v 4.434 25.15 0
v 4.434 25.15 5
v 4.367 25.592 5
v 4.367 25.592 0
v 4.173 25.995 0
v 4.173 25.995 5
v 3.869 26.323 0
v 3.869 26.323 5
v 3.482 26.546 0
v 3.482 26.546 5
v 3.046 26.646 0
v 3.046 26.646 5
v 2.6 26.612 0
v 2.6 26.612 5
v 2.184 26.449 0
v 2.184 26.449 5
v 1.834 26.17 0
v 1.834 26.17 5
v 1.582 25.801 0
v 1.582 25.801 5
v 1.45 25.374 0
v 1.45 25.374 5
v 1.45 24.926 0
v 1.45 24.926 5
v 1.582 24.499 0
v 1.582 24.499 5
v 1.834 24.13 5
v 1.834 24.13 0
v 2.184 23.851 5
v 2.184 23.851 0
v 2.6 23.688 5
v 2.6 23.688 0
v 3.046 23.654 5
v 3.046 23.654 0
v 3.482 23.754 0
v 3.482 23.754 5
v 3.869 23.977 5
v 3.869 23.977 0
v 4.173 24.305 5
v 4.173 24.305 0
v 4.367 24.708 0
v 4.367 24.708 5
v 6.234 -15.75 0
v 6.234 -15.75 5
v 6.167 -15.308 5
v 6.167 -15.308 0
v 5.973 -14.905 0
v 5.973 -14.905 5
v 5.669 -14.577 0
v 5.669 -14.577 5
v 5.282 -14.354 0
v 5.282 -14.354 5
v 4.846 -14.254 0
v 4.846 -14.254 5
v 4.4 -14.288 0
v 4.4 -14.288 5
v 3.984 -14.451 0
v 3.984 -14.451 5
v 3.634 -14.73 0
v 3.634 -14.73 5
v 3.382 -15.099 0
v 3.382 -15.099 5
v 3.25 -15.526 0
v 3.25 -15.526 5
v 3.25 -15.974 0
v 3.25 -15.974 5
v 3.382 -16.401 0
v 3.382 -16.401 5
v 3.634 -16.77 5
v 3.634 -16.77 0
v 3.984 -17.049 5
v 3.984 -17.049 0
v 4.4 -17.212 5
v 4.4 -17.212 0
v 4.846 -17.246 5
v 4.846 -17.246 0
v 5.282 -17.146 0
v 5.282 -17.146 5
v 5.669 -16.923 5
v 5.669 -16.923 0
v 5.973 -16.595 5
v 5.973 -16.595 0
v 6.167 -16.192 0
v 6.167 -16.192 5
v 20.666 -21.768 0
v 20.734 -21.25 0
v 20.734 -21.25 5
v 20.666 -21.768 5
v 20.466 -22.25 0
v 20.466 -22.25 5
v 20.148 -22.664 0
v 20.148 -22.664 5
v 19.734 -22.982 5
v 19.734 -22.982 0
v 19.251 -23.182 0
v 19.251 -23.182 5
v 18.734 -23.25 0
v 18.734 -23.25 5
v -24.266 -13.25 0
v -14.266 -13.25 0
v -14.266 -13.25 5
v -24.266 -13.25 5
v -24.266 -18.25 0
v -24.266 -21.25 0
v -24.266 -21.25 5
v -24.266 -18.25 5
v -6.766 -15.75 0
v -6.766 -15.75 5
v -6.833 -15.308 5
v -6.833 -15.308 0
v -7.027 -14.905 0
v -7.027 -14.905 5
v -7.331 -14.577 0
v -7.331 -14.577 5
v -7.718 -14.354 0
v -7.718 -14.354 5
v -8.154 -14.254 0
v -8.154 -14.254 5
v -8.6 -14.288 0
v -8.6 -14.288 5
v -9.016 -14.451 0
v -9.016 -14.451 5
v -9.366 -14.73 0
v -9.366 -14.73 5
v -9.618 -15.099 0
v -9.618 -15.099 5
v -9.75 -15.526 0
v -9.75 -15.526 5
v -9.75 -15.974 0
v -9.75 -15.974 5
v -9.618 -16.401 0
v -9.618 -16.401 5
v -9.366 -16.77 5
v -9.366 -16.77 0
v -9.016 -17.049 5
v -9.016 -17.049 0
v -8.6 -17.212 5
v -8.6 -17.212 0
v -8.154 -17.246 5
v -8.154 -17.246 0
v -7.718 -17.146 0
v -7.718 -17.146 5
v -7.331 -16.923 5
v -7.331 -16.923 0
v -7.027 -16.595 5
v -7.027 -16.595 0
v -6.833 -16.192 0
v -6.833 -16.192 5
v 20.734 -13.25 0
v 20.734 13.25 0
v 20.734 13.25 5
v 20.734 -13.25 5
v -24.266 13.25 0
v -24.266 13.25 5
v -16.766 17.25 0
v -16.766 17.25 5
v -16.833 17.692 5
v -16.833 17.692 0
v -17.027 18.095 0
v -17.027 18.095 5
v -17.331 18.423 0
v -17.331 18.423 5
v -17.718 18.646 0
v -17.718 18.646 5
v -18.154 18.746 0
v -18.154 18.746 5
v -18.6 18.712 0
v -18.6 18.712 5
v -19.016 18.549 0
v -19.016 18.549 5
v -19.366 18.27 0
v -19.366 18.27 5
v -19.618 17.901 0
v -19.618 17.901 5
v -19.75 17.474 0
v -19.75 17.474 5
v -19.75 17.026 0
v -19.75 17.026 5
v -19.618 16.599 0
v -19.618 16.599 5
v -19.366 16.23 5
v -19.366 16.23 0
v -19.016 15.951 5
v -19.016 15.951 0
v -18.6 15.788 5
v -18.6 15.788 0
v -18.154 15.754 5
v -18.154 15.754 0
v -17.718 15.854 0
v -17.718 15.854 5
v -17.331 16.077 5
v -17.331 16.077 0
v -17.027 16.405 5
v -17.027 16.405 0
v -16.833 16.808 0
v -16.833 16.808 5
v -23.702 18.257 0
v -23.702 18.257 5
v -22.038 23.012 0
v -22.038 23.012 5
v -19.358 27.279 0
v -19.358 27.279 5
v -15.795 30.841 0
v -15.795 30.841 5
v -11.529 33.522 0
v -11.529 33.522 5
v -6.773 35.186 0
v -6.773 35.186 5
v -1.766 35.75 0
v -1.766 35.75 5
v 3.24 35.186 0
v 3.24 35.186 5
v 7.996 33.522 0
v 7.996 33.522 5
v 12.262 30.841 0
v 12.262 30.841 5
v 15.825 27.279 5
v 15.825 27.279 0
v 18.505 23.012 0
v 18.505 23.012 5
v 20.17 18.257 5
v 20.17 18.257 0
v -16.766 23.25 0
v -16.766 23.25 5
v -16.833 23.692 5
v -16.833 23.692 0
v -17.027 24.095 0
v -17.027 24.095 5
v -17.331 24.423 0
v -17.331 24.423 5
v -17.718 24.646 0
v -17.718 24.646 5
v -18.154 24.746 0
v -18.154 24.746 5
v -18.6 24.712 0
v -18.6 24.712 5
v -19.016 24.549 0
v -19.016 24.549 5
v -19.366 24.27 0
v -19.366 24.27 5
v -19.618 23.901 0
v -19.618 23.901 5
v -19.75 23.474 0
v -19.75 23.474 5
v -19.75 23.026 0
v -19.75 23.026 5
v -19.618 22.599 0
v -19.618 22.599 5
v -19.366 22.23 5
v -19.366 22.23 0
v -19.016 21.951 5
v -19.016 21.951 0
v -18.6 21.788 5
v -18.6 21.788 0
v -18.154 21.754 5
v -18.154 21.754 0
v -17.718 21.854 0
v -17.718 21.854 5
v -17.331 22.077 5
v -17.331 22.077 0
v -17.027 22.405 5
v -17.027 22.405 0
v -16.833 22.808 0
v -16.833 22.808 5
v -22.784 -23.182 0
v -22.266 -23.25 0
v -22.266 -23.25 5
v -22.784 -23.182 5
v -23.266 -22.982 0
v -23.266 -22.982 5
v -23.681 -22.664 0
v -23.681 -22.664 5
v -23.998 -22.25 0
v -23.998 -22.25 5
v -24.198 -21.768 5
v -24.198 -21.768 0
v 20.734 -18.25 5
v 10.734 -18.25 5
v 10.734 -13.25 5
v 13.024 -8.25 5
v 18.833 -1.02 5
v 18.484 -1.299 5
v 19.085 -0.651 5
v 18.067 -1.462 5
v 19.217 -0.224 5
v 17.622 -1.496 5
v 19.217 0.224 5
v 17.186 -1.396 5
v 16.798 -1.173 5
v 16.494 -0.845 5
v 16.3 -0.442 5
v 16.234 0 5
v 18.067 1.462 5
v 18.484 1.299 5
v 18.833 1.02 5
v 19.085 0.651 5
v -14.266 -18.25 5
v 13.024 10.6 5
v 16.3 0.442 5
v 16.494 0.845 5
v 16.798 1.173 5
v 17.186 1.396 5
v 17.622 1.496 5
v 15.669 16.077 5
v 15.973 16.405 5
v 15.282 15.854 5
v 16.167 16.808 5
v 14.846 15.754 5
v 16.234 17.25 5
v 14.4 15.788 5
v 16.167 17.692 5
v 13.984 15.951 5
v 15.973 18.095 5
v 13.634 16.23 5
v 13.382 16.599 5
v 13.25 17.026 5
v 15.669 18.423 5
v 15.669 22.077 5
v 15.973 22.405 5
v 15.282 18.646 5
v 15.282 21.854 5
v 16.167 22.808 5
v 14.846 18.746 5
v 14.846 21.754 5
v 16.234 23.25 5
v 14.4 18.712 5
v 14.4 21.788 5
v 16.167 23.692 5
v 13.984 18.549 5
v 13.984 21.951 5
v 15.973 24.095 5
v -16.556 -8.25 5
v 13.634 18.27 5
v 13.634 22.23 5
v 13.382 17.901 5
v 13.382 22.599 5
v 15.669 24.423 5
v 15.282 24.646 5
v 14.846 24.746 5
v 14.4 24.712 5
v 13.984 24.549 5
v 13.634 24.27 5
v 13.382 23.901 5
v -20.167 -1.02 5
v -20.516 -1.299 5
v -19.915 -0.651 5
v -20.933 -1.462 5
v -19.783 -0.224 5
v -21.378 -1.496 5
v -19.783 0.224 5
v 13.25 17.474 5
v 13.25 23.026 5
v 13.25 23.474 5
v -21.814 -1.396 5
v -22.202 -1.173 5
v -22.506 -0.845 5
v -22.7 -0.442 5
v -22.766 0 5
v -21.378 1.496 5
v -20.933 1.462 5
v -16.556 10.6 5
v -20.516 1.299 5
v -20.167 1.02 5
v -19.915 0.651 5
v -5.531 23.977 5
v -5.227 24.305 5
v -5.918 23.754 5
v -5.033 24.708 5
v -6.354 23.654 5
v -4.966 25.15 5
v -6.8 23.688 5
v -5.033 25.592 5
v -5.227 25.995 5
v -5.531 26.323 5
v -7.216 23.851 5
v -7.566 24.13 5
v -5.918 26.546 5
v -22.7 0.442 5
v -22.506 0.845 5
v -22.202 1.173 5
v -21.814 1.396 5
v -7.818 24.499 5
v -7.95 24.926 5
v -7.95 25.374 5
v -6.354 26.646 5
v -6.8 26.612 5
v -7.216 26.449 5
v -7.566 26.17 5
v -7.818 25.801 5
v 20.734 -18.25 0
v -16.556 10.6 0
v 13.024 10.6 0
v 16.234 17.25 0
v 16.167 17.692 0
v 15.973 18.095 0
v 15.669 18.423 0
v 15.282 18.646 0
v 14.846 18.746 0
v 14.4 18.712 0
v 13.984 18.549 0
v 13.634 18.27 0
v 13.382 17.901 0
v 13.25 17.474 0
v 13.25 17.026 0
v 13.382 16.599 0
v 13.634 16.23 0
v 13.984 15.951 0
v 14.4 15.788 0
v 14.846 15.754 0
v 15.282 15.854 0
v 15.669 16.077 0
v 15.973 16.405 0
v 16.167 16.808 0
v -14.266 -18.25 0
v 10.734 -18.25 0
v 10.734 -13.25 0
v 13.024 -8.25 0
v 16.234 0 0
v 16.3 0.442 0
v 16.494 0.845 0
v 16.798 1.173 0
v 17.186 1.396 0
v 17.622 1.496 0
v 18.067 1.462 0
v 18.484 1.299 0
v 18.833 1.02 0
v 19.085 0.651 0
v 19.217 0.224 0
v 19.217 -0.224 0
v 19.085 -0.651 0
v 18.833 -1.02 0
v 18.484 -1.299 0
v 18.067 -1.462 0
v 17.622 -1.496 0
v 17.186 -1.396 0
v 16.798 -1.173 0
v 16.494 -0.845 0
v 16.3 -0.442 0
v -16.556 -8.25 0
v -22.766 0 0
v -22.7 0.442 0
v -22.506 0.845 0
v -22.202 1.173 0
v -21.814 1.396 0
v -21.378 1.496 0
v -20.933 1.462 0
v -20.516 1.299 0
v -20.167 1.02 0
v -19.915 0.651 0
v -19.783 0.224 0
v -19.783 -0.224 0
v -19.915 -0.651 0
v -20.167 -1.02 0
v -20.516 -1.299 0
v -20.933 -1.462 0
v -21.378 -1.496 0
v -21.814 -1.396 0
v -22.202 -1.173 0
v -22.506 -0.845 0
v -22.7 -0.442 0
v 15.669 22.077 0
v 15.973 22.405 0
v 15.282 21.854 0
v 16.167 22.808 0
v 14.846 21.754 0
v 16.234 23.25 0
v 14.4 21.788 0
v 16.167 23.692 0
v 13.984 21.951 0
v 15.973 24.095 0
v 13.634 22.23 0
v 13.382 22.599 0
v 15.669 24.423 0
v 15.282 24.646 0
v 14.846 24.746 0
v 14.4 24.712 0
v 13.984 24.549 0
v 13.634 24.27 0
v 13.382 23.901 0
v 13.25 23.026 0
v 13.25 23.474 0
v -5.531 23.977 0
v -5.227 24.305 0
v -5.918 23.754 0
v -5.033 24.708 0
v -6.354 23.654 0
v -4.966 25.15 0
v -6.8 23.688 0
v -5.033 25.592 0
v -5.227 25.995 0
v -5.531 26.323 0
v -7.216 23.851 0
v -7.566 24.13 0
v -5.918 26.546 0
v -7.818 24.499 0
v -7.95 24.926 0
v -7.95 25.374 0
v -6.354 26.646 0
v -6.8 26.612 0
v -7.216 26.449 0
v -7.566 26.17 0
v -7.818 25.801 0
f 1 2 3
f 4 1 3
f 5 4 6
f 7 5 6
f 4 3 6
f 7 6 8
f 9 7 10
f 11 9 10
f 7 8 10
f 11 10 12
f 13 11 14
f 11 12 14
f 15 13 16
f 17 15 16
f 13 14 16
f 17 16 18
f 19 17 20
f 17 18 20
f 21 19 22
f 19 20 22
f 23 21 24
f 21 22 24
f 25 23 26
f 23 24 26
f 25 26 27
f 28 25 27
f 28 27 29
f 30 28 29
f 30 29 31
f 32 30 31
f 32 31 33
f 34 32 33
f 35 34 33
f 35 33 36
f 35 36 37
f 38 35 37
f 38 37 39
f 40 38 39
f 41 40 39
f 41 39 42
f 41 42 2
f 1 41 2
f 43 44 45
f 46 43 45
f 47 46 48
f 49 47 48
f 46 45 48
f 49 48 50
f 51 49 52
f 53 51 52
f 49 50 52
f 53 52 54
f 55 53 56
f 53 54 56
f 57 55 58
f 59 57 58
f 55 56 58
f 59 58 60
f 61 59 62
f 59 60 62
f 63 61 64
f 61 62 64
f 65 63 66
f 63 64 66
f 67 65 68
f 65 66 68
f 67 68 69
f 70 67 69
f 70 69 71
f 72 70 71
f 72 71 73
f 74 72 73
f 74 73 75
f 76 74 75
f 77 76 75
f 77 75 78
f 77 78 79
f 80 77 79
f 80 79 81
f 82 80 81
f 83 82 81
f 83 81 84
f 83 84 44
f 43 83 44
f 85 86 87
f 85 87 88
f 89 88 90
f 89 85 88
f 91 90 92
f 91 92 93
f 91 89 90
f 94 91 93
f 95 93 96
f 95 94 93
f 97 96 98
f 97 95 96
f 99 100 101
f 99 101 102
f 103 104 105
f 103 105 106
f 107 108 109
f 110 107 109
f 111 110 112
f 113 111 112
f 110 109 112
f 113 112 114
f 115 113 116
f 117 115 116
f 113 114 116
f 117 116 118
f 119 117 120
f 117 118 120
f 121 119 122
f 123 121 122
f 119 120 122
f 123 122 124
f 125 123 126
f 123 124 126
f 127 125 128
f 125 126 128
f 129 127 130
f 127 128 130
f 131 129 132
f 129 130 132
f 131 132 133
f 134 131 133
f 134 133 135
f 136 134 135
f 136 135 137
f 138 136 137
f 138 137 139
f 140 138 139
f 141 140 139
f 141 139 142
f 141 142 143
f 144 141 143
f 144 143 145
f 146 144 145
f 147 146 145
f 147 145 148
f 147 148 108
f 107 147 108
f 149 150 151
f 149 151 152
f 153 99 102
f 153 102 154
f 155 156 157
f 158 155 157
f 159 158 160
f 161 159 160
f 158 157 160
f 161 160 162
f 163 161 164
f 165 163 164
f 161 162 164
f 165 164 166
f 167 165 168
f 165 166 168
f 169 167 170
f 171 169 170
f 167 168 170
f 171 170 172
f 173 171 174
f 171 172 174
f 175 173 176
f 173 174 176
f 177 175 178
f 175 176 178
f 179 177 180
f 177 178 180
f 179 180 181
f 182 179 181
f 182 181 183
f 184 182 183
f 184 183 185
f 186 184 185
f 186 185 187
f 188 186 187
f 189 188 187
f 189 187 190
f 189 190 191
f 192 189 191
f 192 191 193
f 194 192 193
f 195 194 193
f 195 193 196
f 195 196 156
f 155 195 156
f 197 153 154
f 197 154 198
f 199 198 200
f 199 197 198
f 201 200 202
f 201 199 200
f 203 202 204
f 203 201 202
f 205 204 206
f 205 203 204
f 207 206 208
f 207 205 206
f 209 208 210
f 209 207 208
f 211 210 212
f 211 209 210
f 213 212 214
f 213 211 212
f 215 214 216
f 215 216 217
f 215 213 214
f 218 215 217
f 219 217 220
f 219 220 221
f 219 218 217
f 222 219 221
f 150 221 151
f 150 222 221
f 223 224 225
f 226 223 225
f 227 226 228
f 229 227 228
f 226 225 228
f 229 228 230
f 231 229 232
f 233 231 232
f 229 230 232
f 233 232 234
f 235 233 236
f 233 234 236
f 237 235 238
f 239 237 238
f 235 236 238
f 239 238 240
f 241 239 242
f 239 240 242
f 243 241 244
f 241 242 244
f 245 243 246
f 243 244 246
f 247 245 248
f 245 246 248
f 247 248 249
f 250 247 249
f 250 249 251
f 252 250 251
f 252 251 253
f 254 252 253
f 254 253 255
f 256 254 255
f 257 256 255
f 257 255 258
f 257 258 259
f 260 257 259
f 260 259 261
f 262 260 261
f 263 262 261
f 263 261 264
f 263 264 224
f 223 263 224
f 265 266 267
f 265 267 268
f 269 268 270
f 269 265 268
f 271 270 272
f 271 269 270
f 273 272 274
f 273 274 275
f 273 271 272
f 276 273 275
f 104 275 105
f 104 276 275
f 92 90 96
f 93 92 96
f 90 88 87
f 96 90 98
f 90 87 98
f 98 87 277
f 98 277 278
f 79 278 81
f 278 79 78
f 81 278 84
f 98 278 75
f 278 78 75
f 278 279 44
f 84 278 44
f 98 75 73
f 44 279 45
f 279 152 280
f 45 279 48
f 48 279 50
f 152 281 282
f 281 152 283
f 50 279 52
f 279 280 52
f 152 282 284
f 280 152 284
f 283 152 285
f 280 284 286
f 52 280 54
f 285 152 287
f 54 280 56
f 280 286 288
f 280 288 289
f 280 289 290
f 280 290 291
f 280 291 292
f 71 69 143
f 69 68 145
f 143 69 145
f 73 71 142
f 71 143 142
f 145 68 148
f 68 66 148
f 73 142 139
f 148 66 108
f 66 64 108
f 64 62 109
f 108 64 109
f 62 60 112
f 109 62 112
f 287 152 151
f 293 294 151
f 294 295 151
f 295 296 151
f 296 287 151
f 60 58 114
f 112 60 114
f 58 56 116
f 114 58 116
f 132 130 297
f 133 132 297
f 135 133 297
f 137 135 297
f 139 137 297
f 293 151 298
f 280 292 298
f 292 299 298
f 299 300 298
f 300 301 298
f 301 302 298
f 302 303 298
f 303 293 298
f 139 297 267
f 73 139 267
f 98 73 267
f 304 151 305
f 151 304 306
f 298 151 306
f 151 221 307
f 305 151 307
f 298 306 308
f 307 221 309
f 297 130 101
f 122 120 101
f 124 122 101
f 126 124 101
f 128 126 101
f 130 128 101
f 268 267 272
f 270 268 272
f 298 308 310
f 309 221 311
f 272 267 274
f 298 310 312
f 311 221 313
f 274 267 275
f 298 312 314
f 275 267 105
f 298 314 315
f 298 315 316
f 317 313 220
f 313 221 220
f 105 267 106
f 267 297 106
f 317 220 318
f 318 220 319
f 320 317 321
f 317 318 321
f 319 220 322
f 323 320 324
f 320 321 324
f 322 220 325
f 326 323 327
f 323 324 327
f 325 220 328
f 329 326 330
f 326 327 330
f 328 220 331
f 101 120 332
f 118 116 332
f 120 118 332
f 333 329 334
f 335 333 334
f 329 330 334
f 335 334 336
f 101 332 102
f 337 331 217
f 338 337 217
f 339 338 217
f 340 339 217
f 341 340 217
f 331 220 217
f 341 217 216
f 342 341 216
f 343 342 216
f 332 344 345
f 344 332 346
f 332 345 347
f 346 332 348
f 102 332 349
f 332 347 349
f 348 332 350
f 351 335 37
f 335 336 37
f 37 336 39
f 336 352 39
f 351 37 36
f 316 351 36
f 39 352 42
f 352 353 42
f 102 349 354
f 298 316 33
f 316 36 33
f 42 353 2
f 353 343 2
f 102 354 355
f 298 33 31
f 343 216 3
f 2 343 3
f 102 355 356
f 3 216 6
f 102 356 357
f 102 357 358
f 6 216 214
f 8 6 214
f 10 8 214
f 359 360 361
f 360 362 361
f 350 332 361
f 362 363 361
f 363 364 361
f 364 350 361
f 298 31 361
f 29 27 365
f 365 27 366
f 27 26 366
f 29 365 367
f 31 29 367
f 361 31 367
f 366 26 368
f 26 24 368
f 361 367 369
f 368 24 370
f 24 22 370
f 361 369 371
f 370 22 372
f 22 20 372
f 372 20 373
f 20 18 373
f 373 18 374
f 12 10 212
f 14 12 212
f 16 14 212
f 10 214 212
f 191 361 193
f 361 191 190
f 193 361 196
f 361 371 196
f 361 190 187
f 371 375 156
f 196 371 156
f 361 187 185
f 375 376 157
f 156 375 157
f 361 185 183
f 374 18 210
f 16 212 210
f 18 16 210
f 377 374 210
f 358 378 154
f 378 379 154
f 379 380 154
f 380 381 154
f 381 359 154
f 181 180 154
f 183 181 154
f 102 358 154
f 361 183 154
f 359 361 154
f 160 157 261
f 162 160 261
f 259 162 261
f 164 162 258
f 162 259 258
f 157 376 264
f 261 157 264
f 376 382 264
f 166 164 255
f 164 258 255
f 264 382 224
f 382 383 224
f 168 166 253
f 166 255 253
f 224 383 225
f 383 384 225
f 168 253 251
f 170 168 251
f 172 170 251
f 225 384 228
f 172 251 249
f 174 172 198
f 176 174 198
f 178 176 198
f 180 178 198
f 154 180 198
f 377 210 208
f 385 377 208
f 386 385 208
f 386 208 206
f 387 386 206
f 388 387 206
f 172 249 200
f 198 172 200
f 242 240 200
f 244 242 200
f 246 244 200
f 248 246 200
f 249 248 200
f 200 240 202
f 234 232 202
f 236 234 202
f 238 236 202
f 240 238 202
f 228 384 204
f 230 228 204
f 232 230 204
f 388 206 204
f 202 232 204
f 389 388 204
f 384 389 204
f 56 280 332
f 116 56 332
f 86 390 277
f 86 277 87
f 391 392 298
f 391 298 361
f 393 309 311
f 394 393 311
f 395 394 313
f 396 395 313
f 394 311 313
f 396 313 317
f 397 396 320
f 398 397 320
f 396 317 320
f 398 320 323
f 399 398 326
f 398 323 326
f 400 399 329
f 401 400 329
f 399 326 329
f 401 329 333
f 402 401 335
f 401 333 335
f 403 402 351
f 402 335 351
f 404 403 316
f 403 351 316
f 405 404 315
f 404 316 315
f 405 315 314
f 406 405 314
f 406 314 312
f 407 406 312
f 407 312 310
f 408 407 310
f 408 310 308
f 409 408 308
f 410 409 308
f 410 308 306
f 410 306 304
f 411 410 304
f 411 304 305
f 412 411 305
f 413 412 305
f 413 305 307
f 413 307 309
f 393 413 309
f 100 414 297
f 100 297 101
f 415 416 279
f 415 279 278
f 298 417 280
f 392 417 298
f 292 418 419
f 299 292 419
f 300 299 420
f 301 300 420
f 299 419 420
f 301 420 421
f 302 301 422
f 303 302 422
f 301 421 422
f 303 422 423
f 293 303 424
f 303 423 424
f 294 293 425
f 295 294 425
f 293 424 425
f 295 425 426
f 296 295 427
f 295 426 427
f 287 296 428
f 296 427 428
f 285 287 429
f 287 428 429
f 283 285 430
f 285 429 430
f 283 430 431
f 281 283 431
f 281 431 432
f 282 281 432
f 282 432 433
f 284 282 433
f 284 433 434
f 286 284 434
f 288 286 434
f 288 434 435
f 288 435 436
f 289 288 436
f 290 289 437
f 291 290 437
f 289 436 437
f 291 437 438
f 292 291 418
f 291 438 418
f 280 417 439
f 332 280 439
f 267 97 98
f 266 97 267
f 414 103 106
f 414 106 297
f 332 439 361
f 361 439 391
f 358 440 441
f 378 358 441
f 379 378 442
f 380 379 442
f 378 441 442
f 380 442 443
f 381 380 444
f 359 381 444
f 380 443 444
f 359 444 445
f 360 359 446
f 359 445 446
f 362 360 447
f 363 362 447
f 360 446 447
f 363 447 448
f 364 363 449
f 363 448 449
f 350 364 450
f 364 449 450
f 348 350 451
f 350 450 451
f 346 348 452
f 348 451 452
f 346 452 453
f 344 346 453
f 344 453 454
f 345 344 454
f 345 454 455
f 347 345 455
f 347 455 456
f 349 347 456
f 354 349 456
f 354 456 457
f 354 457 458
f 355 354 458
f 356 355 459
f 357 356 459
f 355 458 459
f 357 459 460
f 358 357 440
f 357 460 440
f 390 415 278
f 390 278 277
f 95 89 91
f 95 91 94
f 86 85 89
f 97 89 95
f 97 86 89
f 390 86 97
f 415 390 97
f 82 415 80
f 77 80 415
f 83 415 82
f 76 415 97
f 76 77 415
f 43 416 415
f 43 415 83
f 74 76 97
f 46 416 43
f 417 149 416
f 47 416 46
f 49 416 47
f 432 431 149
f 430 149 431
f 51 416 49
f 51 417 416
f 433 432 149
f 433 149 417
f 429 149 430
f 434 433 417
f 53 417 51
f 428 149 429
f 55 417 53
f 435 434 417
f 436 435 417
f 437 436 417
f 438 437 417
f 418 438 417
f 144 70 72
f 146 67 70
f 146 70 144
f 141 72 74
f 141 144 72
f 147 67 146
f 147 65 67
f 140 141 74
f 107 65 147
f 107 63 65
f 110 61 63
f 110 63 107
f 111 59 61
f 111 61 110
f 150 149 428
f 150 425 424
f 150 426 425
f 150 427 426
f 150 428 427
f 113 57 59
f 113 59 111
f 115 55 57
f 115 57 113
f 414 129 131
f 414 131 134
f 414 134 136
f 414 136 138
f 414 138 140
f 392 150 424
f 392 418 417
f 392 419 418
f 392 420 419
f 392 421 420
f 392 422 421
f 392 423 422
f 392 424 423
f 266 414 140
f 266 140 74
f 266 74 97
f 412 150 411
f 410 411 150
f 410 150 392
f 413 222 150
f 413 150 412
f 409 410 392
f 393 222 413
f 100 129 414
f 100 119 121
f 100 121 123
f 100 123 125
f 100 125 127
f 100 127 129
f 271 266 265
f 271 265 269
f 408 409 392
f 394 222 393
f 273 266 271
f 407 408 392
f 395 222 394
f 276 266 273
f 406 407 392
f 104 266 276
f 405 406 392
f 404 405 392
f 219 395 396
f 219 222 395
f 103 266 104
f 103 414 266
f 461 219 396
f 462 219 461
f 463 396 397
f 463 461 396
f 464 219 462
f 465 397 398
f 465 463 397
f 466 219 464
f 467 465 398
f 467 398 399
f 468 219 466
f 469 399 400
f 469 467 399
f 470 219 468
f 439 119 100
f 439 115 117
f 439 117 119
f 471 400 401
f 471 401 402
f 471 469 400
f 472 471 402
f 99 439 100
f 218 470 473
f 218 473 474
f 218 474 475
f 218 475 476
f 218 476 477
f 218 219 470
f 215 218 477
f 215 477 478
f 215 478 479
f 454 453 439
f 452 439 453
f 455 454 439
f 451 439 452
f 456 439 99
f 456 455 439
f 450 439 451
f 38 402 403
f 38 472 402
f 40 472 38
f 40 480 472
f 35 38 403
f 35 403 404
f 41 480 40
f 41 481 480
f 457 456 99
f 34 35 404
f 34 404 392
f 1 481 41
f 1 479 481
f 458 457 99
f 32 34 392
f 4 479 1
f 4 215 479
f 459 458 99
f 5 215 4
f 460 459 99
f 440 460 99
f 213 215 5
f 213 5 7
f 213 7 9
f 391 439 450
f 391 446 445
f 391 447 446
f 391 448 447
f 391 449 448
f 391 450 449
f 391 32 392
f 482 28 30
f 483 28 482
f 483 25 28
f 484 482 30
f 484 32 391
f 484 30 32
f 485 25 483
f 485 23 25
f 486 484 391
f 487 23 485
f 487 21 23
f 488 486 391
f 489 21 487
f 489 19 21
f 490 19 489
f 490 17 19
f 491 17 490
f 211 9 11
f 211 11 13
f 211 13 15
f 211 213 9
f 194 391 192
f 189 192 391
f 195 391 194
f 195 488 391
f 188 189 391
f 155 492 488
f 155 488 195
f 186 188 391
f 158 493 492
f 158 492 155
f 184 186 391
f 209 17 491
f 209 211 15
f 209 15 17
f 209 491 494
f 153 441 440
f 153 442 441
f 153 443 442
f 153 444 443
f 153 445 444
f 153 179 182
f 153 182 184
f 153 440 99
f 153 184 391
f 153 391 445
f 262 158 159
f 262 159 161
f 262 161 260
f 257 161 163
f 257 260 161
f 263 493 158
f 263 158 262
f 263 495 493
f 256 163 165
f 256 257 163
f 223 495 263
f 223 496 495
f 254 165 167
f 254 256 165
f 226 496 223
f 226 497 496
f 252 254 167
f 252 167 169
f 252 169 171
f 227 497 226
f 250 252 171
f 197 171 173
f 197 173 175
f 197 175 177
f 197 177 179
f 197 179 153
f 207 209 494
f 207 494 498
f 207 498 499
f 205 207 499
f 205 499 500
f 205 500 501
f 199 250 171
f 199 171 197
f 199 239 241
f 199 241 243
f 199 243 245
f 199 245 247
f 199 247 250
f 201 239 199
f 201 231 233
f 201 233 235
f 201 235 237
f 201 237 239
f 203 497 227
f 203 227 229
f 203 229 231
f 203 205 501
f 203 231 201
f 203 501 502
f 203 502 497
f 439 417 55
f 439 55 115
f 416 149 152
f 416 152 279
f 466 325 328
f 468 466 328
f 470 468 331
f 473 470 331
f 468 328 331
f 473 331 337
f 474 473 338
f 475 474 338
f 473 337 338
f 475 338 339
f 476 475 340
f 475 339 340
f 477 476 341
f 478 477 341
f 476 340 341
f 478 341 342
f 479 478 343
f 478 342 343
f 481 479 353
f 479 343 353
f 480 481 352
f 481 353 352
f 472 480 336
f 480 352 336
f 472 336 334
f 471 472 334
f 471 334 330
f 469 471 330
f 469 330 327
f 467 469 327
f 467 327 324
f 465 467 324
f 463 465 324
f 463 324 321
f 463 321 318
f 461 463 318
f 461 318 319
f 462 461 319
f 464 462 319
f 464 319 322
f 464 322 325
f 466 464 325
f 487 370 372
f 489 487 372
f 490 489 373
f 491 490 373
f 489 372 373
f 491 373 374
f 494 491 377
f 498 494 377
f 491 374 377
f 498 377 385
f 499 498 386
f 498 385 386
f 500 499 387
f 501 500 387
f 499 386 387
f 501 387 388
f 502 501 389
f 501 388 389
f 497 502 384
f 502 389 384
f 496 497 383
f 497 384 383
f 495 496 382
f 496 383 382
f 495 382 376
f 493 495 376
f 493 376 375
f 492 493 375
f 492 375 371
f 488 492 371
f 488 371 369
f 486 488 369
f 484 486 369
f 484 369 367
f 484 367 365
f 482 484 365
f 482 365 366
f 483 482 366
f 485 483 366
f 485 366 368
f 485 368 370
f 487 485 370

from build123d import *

# Parameters (mm, degrees)
RESSALTO_EXTRUS_O2_DEPTH = 5
ESBO_O9_W                = 29.58
ESBO_O9_H                = 18.85
CORTE_EXTRUS_O1_DEPTH    = 5
ESBO_O10_R               = 1.5
CORTE_EXTRUS_O2_DEPTH    = 5
ESBO_O12_R               = 1.5
CORTE_EXTRUS_O3_DEPTH    = 10
ESBO_O13_R               = 1.5
CORTE_EXTRUS_O4_DEPTH    = 10
ESBO_O14_R               = 1.5
CORTE_EXTRUS_O5_DEPTH    = 76


with BuildPart() as part:
    # Esboço8 → Ressalto-extrusão2 (new body)
    with BuildSketch(Plane.XY):
        with BuildLine():
            Line((-24.266341706, -3.25), (-24.266341706, 13.25))
            ThreePointArc((-24.266341706, 13.25), (-1.766341706, 35.75), (20.733658294, 13.25))
            Line((20.733658294, 13.25), (20.733658294, -3.222268622))
            Line((20.733658294, -3.222268622), (20.733658294, -3.25))
            Line((20.733658294, -3.25), (20.733658294, -13.25))
            Line((20.733658294, -13.25), (10.733658294, -13.25))
            Line((10.733658294, -13.25), (10.733658294, -18.25))
            Line((10.733658294, -18.25), (20.733658294, -18.25))
            Line((20.733658294, -18.25), (20.733658294, -21.25))
            ThreePointArc((20.733658294, -21.25), (20.147871857, -22.664213562), (18.733658294, -23.25))
            Line((18.733658294, -23.25), (-22.266341706, -23.25))
            ThreePointArc((-22.266341706, -23.25), (-23.680555268, -22.664213562), (-24.266341706, -21.25))
            Line((-24.266341706, -21.25), (-24.266341706, -18.25))
            Line((-24.266341706, -18.25), (-14.266341706, -18.25))
            Line((-14.266341706, -18.25), (-14.266341706, -13.25))
            Line((-14.266341706, -13.25), (-24.266341706, -13.25))
            Line((-24.266341706, -13.25), (-24.266341706, -3.25))
        make_face()
    extrude(amount=RESSALTO_EXTRUS_O2_DEPTH)

    # Esboço9 → Corte-extrusão1 (cut)
    with BuildSketch(Plane(origin=(0, 0, 0), x_dir=(-1, 0, 0), z_dir=(0, 0, -1))):
        with Locations((1.766341706, 1.175)):
            Rectangle(ESBO_O9_W, ESBO_O9_H)
    extrude(amount=-CORTE_EXTRUS_O1_DEPTH, mode=Mode.SUBTRACT)

    # Esboço10 → Corte-extrusão2 (cut)
    with BuildSketch(Plane(origin=(0, 0, 0), x_dir=(-1, 0, 0), z_dir=(0, 0, -1))):
        with Locations((-17.733658294, 0)):
            Circle(ESBO_O10_R)
        with Locations((21.266341706, 0)):
            Circle(ESBO_O10_R)
    extrude(amount=-CORTE_EXTRUS_O2_DEPTH, mode=Mode.SUBTRACT)

    # Esboço12 → Corte-extrusão3 (cut)
    with BuildSketch(Plane.XY.offset(5)):
        with Locations((4.733658294, -15.75)):
            Circle(ESBO_O12_R)
        with Locations((-8.266341706, -15.75)):
            Circle(ESBO_O12_R)
    extrude(amount=-CORTE_EXTRUS_O3_DEPTH, mode=Mode.SUBTRACT)

    # Esboço13 → Corte-extrusão4 (cut)
    with BuildSketch(Plane.XY.offset(5)):
        with Locations((2.933658294, 25.15)):
            Circle(ESBO_O13_R)
        with Locations((-6.466341706, 25.15)):
            Circle(ESBO_O13_R)
    extrude(amount=-CORTE_EXTRUS_O4_DEPTH, mode=Mode.SUBTRACT)

    # Esboço14 → Corte-extrusão5 (cut)
    with BuildSketch(Plane.XY.offset(5)):
        with Locations((14.733658294, 17.25)):
            Circle(ESBO_O14_R)
        with Locations((14.733658294, 23.25)):
            Circle(ESBO_O14_R)
        with Locations((-18.266341706, 23.25)):
            Circle(ESBO_O14_R)
        with Locations((-18.266341706, 17.25)):
            Circle(ESBO_O14_R)
    extrude(amount=-CORTE_EXTRUS_O5_DEPTH, mode=Mode.SUBTRACT)


solid = part.part
